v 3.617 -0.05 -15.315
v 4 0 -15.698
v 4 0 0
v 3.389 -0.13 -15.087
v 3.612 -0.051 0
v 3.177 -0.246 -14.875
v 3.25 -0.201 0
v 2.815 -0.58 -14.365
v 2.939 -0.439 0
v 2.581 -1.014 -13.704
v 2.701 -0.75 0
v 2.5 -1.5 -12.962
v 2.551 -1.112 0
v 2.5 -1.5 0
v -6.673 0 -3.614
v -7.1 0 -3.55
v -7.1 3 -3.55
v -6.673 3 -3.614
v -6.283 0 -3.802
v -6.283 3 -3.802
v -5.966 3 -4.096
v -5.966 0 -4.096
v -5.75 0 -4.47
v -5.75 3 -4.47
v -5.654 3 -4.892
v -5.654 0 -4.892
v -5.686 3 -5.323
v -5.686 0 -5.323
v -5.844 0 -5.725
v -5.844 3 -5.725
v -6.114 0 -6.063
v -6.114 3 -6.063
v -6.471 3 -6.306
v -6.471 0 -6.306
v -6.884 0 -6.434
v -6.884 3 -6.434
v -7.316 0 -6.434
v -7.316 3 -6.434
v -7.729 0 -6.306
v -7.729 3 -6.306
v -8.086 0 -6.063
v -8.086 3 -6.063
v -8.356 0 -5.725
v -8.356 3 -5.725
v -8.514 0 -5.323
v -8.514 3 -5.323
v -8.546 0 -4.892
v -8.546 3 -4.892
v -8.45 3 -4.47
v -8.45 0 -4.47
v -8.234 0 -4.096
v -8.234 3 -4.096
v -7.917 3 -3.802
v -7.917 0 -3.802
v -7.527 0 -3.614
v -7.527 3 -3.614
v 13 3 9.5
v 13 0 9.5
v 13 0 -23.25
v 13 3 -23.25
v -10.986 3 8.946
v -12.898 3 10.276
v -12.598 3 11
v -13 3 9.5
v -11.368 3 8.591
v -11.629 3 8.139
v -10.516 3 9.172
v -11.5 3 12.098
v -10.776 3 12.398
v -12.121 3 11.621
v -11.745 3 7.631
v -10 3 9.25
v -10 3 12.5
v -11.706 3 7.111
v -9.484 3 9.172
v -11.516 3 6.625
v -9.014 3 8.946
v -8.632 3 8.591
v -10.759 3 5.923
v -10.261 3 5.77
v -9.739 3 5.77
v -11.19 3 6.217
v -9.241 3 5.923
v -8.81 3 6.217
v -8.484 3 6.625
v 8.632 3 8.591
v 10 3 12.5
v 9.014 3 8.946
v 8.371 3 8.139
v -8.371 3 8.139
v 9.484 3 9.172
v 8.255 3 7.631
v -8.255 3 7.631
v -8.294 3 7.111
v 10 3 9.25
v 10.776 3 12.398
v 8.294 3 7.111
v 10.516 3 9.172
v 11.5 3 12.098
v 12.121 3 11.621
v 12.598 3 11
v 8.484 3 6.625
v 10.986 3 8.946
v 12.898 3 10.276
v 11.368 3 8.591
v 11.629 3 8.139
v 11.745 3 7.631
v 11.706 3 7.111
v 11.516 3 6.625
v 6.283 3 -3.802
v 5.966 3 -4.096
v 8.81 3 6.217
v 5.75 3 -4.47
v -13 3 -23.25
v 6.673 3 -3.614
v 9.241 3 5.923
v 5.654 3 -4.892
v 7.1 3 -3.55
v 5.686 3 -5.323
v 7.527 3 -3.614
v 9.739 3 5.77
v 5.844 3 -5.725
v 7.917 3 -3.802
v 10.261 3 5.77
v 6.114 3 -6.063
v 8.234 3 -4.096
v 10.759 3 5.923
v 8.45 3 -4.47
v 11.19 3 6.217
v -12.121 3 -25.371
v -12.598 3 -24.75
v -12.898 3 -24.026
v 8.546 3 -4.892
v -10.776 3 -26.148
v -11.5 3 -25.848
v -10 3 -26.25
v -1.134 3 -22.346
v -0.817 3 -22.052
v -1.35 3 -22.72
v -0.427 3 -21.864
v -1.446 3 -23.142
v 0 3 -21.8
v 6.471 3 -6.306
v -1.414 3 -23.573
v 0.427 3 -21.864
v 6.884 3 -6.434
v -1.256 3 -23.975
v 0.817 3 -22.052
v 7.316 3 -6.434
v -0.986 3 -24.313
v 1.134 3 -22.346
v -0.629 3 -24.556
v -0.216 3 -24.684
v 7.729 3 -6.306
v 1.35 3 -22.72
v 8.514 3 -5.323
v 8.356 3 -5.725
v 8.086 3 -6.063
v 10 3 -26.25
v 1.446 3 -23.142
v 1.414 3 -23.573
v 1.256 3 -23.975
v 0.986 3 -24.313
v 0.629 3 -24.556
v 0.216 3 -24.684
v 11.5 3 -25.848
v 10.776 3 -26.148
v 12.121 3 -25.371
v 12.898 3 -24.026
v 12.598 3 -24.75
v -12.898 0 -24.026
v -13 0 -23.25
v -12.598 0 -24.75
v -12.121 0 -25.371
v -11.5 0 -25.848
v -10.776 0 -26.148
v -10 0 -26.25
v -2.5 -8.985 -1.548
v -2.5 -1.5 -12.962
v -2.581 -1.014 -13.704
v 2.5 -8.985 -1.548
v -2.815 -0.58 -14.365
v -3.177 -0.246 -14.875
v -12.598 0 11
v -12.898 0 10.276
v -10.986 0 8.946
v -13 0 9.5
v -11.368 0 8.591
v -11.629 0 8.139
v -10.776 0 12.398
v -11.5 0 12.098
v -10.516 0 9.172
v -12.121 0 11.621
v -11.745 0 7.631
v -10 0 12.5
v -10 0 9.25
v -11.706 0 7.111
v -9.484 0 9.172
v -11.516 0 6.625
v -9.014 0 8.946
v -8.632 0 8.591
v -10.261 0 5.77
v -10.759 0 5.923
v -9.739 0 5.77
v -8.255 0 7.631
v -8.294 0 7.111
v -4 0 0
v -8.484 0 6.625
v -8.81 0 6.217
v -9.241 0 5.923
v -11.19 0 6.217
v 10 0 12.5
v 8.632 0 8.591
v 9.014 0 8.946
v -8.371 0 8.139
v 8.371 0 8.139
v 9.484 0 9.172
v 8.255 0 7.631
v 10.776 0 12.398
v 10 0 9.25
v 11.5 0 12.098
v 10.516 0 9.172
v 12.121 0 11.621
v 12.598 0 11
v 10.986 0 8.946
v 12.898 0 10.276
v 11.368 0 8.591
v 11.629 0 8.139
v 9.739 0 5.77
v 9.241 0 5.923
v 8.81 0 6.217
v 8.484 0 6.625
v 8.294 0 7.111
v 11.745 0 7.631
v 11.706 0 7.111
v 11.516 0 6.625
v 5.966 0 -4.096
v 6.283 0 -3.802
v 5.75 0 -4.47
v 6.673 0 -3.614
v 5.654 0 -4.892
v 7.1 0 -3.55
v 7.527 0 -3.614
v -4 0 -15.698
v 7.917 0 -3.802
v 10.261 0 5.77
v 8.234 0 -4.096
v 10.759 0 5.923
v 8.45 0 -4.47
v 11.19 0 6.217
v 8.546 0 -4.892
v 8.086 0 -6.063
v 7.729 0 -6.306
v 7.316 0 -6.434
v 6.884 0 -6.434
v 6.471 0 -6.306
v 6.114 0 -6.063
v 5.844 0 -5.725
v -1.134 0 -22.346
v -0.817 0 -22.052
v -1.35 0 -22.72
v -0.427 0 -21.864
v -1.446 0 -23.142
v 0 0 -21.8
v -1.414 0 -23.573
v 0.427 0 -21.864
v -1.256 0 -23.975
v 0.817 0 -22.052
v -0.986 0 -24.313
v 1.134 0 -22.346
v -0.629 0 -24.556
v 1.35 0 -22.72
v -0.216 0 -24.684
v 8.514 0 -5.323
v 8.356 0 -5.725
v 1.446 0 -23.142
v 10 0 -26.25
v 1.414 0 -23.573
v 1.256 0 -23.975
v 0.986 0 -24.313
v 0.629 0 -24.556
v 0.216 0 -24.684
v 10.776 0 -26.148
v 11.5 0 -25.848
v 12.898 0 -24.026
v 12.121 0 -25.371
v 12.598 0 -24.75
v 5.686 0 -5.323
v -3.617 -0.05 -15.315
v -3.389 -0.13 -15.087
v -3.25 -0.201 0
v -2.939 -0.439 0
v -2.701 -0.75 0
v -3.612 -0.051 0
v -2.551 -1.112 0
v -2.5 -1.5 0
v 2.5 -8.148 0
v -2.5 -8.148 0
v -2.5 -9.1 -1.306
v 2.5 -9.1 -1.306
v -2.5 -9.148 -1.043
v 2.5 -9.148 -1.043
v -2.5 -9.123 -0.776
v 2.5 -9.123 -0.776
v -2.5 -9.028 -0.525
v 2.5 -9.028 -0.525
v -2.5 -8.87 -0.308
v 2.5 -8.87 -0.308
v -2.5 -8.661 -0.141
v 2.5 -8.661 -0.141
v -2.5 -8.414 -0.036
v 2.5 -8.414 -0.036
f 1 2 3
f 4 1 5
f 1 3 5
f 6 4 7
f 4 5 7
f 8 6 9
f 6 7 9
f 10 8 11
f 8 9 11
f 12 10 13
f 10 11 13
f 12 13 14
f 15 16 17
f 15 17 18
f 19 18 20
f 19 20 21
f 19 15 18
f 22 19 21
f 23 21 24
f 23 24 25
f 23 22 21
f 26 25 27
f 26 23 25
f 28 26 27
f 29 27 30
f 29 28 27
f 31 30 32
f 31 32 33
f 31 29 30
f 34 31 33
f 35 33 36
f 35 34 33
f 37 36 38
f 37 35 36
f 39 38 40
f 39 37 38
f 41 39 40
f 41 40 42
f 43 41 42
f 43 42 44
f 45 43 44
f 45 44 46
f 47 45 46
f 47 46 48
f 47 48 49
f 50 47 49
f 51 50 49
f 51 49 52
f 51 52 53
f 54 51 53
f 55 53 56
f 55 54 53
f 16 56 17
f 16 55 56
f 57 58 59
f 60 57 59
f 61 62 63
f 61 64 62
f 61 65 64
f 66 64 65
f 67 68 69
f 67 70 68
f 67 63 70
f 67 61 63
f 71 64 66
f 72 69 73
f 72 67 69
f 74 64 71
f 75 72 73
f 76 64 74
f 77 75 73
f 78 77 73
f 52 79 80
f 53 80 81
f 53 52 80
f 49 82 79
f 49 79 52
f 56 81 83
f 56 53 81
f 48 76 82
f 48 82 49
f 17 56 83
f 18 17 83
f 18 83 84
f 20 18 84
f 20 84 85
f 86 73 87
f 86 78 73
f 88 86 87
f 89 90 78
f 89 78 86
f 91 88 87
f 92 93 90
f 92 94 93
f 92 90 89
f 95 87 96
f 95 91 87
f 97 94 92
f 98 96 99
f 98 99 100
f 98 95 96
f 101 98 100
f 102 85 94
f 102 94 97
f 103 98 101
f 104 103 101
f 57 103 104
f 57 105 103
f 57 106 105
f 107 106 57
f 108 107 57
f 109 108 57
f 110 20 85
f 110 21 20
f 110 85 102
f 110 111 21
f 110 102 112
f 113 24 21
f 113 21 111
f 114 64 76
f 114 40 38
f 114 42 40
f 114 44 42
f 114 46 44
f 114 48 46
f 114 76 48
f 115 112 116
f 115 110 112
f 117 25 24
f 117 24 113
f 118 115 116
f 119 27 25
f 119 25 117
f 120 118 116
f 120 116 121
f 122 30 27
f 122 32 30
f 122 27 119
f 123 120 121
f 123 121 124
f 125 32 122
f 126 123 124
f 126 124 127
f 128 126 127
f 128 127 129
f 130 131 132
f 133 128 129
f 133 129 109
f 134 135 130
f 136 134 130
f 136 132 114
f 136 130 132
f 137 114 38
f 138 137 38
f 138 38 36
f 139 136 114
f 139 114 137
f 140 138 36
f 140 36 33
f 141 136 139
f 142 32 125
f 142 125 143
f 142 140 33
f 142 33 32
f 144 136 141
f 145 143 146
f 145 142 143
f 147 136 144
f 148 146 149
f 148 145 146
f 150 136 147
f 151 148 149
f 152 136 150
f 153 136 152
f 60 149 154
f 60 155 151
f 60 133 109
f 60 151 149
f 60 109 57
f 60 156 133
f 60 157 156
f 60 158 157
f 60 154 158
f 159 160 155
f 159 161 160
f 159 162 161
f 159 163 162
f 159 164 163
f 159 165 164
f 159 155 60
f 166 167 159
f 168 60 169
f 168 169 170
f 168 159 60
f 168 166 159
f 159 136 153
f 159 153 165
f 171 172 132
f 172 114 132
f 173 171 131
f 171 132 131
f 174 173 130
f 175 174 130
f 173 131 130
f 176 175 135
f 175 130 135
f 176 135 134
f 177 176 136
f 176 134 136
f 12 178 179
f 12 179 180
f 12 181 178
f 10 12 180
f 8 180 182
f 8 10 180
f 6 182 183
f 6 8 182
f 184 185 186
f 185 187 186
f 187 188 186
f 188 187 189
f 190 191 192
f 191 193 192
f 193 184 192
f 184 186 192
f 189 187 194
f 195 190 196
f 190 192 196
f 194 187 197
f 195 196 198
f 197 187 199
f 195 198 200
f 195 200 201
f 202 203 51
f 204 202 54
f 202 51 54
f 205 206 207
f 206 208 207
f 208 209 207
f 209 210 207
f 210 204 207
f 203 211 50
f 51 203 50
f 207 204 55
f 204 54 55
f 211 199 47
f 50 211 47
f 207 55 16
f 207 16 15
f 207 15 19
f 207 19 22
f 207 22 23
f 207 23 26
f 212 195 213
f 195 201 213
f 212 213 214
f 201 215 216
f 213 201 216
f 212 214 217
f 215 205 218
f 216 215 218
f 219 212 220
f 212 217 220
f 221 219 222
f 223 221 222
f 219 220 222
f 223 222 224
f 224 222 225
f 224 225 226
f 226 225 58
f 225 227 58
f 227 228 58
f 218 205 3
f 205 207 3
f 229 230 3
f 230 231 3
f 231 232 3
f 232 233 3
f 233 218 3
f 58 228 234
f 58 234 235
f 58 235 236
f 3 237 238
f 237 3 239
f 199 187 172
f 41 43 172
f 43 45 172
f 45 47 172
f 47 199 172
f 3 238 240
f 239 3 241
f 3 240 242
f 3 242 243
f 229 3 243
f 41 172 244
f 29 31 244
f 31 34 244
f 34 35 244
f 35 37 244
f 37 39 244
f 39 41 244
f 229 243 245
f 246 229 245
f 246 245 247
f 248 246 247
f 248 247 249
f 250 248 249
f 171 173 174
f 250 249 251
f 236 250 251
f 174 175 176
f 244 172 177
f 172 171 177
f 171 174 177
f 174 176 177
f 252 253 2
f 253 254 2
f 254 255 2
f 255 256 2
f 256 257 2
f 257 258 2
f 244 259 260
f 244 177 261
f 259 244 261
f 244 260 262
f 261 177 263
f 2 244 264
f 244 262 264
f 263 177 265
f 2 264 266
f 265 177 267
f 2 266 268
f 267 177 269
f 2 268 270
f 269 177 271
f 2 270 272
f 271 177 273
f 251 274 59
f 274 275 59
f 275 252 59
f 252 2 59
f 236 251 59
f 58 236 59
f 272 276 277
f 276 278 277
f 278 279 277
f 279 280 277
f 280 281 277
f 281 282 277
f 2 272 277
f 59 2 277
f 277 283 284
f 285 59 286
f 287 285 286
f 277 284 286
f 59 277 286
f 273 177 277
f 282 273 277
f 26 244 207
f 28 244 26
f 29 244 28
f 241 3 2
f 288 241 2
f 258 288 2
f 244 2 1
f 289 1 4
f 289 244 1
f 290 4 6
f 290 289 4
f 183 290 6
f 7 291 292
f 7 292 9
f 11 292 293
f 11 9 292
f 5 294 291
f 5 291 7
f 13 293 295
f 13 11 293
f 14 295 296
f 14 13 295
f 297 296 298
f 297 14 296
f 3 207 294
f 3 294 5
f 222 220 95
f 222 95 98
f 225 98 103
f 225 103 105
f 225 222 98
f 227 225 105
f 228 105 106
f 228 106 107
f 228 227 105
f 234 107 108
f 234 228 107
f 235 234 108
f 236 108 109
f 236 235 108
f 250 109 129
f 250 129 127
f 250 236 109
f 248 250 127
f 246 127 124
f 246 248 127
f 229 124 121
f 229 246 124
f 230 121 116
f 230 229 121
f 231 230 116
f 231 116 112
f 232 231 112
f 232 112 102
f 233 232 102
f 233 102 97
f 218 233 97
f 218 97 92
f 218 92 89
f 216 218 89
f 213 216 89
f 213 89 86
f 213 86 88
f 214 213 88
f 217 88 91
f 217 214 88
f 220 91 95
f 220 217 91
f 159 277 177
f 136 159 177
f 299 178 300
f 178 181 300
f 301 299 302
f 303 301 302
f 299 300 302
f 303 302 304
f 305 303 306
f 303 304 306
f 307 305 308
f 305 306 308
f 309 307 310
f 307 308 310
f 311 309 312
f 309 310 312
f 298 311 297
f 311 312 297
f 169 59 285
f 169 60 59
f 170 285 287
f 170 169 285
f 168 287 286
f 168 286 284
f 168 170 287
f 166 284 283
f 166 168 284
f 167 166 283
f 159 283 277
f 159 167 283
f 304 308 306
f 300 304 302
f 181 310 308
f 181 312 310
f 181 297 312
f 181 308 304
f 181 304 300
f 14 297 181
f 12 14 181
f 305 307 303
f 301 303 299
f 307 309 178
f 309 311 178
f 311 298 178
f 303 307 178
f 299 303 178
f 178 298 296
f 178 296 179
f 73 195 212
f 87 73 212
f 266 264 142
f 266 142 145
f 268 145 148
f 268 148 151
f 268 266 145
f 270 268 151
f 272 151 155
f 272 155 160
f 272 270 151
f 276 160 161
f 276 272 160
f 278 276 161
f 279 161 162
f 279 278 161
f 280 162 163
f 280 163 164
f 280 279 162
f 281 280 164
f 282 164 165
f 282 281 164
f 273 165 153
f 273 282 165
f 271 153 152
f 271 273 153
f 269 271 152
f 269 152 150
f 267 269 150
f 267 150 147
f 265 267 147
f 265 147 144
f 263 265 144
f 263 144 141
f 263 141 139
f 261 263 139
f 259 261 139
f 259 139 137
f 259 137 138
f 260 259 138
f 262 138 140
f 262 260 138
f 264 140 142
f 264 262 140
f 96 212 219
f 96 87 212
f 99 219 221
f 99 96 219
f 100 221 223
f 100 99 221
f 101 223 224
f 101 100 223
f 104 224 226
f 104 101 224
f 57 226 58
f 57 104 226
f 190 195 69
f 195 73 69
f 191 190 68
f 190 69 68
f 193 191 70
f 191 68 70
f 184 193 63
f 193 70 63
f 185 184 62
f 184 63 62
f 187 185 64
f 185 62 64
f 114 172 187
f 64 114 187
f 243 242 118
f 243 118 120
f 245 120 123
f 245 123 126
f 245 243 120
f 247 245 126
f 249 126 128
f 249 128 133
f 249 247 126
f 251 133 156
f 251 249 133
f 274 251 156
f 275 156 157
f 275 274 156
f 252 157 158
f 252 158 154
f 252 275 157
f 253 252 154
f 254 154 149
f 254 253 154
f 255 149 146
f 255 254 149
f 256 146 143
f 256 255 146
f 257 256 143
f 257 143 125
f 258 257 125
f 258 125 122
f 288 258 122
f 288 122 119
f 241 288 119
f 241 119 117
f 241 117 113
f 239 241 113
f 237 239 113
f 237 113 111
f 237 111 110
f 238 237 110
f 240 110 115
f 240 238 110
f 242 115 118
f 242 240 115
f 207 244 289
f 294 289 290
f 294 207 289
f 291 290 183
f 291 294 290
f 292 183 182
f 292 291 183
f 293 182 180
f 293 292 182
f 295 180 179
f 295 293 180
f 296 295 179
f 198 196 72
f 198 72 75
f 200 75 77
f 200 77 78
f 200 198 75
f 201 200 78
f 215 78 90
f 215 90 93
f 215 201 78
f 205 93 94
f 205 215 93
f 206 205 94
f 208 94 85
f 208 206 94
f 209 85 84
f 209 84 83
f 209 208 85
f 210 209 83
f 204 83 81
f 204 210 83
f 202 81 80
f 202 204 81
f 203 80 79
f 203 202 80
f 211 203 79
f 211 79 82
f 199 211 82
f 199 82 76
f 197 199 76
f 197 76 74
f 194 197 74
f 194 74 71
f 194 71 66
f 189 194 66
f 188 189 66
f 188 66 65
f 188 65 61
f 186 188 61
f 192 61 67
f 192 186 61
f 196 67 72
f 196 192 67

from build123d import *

# Parameters (mm, degrees)
SKETCH_1_R      = 1.75
SKETCH_1_R_2    = 1.45
EXTRUDE_1_DEPTH = 3
FILLET_1_R      = 3
EXTRUDE_2_DEPTH = 2.5
FILLET_2_R      = 1.5
FILLET_3_R      = 1


with BuildPart() as part:
    # 草图1 → 凸台-拉伸1 (new body)
    with BuildSketch(Plane(origin=(0, 0, 0), x_dir=(1, 0, 0), z_dir=(0, 1, 0))):
        Polygon((-13, 22.5), (-13, -12.5), (13, -12.5), (13, 22.5), (13, 26.25), (-13, 26.25), align=None)
        with Locations(Location((-10, -7.5, 0), (0, 0, 270))):
            Circle(SKETCH_1_R, mode=Mode.SUBTRACT)
        with Locations(Location((10, -7.5, 0), (0, 0, 270))):
            Circle(SKETCH_1_R, mode=Mode.SUBTRACT)
        with Locations(Location((0, 23.25, 0), (0, 0, 270))):
            Circle(SKETCH_1_R_2, mode=Mode.SUBTRACT)
        with Locations(Location((-7.1, 5, 0), (0, 0, 270))):
            Circle(SKETCH_1_R_2, mode=Mode.SUBTRACT)
        with Locations(Location((7.1, 5, 0), (0, 0, 270))):
            Circle(SKETCH_1_R_2, mode=Mode.SUBTRACT)
    extrude(amount=EXTRUDE_1_DEPTH)

    # 圆角1
    fillet_1_edges = [part.edges().sort_by_distance(p)[0] for p in [
        (13, 1.5, 12.5),
        (-13, 1.5, 12.5),
        (-13, 1.5, -26.25),
        (13, 1.5, -26.25),
    ]]
    fillet(fillet_1_edges, radius=FILLET_1_R)

    # 草图3 → 凸台-拉伸2 (add, symmetric)
    with BuildSketch(Plane(origin=(0, 0, 0), x_dir=(0, 0, -1), z_dir=(1, 0, 0))):
        Polygon((0, 0), (0, -10), (15.25, 0), align=None)
    extrude(amount=EXTRUDE_2_DEPTH, both=True)

    # 圆角2
    fillet_2_edges = [part.edges().sort_by_distance(p)[0] for p in [
        (-2.5, 0, -7.625),
        (0, 0, -15.25),
        (2.5, 0, -7.625),
    ]]
    fillet(fillet_2_edges, radius=FILLET_2_R)

    # 圆角3
    fillet_3_edges = [part.edges().sort_by_distance(p)[0] for p in [
        (0, -10, 0),
    ]]
    fillet(fillet_3_edges, radius=FILLET_3_R)


solid = part.part
